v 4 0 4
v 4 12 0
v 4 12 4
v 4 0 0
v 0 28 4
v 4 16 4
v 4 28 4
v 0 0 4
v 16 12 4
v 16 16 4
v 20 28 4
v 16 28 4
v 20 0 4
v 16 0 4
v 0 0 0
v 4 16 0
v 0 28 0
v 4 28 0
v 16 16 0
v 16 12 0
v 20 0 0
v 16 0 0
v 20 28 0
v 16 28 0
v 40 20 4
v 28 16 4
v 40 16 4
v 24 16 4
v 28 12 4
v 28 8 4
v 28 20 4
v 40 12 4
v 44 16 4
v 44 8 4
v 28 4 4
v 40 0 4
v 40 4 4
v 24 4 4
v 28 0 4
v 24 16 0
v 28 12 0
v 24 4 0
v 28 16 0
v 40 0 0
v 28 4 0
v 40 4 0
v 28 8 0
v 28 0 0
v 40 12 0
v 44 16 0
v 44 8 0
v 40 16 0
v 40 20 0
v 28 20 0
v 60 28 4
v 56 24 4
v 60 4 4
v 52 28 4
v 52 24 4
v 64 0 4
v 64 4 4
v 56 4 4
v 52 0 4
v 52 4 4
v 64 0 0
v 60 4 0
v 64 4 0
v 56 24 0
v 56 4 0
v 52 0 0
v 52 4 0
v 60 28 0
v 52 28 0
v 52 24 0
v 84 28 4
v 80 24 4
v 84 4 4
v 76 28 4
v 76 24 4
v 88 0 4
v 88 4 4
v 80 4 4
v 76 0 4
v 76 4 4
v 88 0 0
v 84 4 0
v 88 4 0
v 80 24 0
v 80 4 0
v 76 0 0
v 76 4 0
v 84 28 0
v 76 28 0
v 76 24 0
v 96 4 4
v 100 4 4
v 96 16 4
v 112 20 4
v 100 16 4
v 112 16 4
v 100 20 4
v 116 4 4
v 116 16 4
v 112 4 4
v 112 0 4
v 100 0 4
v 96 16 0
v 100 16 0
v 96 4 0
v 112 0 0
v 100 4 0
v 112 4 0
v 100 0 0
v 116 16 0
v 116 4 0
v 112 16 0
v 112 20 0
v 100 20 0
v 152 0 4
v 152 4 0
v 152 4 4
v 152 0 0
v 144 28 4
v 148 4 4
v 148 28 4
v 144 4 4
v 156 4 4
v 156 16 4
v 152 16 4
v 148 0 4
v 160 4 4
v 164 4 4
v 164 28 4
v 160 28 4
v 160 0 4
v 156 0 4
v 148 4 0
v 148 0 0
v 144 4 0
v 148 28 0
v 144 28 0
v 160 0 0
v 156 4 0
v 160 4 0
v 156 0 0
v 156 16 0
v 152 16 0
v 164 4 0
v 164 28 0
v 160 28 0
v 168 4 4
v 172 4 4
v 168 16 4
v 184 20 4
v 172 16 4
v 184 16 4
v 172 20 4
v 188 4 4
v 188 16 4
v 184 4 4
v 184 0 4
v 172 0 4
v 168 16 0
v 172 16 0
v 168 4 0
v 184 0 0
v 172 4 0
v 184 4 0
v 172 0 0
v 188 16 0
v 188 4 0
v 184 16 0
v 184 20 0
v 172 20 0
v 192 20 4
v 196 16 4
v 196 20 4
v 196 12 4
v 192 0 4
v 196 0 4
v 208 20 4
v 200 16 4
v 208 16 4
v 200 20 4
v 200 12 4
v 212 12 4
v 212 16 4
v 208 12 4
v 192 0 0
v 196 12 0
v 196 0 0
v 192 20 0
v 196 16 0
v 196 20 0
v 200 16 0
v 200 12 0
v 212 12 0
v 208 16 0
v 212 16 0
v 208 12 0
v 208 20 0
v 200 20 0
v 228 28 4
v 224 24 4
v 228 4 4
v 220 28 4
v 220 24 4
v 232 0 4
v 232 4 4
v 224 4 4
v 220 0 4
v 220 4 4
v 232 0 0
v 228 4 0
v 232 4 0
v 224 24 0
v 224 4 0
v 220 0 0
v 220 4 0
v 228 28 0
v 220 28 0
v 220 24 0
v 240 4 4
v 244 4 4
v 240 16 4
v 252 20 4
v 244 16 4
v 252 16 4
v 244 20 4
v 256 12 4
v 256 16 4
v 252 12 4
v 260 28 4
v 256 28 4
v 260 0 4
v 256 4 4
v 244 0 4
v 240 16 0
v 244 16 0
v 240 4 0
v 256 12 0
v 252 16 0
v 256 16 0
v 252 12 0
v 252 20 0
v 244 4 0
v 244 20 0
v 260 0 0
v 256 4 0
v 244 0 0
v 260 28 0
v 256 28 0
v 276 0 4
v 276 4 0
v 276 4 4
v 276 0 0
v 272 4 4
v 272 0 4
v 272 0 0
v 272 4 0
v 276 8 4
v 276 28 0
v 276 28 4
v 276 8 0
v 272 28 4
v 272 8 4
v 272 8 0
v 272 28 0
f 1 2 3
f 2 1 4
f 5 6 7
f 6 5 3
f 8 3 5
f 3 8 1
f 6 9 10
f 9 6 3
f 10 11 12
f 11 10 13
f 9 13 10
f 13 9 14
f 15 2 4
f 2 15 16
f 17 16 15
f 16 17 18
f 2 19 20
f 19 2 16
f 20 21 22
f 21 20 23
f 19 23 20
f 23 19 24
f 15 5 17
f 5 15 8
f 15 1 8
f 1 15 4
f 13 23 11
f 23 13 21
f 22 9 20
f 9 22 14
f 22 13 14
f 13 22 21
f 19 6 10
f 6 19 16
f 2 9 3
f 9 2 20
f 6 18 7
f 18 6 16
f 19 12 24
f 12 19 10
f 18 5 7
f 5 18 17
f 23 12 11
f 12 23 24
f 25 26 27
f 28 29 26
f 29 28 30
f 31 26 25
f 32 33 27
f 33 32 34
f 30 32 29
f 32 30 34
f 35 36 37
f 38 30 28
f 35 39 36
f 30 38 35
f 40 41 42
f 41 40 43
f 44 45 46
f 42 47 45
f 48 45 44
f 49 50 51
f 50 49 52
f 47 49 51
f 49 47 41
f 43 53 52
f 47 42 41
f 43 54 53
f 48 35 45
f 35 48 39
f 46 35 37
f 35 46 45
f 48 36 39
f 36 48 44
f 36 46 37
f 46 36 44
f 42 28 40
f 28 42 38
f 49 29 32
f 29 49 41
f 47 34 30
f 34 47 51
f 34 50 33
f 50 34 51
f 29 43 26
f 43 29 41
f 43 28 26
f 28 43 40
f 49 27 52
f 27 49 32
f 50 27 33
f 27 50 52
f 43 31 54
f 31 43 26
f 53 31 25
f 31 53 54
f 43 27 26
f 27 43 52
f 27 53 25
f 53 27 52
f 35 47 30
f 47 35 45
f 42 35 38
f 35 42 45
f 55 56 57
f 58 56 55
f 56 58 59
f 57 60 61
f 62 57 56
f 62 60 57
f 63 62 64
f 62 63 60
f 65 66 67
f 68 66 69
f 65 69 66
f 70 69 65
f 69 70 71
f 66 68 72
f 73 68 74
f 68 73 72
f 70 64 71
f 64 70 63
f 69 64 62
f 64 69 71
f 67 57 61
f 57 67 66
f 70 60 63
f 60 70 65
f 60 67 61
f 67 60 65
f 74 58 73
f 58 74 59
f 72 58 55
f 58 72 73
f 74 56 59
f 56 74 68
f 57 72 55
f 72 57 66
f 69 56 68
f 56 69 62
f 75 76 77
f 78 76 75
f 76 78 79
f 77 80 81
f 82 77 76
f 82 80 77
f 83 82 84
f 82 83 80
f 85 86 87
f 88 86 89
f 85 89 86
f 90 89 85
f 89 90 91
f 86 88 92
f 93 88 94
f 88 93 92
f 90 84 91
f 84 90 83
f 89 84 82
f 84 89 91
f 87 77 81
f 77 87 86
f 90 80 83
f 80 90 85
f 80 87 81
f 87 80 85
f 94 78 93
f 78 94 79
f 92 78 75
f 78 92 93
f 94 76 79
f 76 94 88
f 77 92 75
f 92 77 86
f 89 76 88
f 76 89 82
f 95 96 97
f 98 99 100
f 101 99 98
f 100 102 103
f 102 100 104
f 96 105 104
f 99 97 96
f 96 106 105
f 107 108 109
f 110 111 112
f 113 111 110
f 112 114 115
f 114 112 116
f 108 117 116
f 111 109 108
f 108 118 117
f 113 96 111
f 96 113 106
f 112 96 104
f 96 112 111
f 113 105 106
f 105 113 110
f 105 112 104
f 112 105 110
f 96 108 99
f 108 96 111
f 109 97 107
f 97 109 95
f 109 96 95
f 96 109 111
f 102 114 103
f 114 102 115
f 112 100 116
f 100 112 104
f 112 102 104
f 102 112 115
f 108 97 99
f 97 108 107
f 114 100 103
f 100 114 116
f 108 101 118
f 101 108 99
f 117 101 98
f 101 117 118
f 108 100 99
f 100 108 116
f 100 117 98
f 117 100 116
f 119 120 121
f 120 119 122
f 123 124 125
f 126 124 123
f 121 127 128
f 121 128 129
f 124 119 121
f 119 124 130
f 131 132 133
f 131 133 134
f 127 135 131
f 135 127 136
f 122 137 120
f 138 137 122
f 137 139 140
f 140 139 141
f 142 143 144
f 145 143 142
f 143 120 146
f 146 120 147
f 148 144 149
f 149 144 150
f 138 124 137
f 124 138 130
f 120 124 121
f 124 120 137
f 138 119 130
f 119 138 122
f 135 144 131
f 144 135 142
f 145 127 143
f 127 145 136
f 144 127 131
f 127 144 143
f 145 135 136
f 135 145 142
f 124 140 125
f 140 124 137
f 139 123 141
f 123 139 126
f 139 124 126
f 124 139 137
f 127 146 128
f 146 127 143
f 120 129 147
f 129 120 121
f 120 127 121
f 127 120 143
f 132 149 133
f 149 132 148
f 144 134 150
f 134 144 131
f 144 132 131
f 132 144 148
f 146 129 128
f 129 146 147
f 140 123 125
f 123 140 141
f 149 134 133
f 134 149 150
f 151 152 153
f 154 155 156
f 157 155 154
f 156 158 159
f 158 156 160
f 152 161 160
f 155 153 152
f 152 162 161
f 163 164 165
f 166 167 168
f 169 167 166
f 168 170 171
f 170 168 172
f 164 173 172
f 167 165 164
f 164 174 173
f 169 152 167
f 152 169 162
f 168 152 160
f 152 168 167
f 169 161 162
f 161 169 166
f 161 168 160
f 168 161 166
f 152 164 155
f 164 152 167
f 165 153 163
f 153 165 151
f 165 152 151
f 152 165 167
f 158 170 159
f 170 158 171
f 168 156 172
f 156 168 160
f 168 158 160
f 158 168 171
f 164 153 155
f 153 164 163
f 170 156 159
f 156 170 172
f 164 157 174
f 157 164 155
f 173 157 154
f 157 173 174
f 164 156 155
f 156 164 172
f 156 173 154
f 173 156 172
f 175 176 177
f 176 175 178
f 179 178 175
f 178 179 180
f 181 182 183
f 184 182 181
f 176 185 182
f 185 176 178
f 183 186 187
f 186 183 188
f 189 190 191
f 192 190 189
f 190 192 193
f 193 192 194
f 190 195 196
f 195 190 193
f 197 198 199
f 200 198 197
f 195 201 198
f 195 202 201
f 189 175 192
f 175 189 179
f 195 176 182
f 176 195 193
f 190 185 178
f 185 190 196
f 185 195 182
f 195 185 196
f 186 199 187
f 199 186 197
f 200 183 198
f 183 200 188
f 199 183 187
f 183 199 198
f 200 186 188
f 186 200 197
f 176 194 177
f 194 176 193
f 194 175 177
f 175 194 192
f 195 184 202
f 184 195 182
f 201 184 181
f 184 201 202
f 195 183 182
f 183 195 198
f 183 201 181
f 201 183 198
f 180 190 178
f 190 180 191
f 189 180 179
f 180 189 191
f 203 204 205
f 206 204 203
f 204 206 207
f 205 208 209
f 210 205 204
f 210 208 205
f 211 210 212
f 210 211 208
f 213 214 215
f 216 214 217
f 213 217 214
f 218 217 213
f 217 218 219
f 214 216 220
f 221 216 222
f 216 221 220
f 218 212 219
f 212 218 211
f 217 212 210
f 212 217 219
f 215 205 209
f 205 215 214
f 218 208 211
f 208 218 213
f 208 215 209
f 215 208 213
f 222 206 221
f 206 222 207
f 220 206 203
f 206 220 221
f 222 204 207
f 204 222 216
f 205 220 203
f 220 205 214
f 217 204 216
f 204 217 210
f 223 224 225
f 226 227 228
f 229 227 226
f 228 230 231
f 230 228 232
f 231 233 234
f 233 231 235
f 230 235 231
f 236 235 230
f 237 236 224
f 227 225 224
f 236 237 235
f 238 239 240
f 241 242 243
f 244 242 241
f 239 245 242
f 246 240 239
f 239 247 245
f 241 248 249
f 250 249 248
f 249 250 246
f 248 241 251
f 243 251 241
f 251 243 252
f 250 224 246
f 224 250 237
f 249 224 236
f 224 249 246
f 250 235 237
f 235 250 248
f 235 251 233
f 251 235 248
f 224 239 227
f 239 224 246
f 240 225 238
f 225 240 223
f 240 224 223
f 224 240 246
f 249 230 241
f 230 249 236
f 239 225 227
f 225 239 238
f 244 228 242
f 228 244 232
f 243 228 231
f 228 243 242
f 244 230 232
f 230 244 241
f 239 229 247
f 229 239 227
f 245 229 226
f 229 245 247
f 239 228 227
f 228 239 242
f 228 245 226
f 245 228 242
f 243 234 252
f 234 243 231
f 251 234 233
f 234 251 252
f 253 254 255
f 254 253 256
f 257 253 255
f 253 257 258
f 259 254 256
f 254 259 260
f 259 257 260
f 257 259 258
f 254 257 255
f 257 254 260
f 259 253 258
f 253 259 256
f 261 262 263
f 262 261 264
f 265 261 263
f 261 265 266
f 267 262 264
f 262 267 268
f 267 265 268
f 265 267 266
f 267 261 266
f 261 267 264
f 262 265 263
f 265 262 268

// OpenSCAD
//Draw text
scale([4,4,4]) drawtext("Hello World!");

//Draw character set
//scale([2,2,2]) drawtext(" !\"#$%&'()*+,-./0123456789:;<=>?@ABCDEFGHIJKLMNOPQRSTUVWXYZ[\\]^_`abcdefghijklmnopqrstuvwxyz{|}");

module drawtext(text,center=false) {
	//Characters
	chars = " !\"#$%&'()*+,-./0123456789:;<=>?@ABCDEFGHIJKLMNOPQRSTUVWXYZ[\\]^_`abcdefghijklmnopqrstuvwxyz{|}";

	//Chracter table defining 5x7 characters
	//Adapted from: http://www.geocities.com/dinceraydin/djlcdsim/chartable.js
	char_table = [ [ 0, 0, 0, 0, 0, 0, 0],
                  [ 4, 0, 4, 4, 4, 4, 4],
                  [ 0, 0, 0, 0,10,10,10],
                  [10,10,31,10,31,10,10],
                  [ 4,30, 5,14,20,15, 4],
                  [ 3,19, 8, 4, 2,25,24],
                  [13,18,21, 8,20,18,12],
                  [ 0, 0, 0, 0, 8, 4,12],
                  [ 2, 4, 8, 8, 8, 4, 2],
                  [ 8, 4, 2, 2, 2, 4, 8],
                  [ 0, 4,21,14,21, 4, 0],
                  [ 0, 4, 4,31, 4, 4, 0],
                  [ 8, 4,12, 0, 0, 0, 0],
                  [ 0, 0, 0,31, 0, 0, 0],
                  [12,12, 0, 0, 0, 0, 0],
                  [ 0,16, 8, 4, 2, 1, 0],
                  [14,17,25,21,19,17,14],
                  [14, 4, 4, 4, 4,12, 4],
                  [31, 8, 4, 2, 1,17,14],
                  [14,17, 1, 2, 4, 2,31],
                  [ 2, 2,31,18,10, 6, 2],
                  [14,17, 1, 1,30,16,31],
                  [14,17,17,30,16, 8, 6],
                  [ 8, 8, 8, 4, 2, 1,31],
                  [14,17,17,14,17,17,14],
                  [12, 2, 1,15,17,17,14],
                  [ 0,12,12, 0,12,12, 0],
                  [ 8, 4,12, 0,12,12, 0],
                  [ 2, 4, 8,16, 8, 4, 2],
                  [ 0, 0,31, 0,31, 0, 0],
                  [16, 8, 4, 2, 4, 8,16],
                  [ 4, 0, 4, 2, 1,17,14],
                  [14,21,21,13, 1,17,14],
                  [17,17,31,17,17,17,14],
                  [30,17,17,30,17,17,30],
                  [14,17,16,16,16,17,14],
                  [30,17,17,17,17,17,30],
                  [31,16,16,30,16,16,31],
                  [16,16,16,30,16,16,31],
                  [15,17,17,23,16,17,14],
                  [17,17,17,31,17,17,17],
                  [14, 4, 4, 4, 4, 4,14],
                  [12,18, 2, 2, 2, 2, 7],
                  [17,18,20,24,20,18,17],
                  [31,16,16,16,16,16,16],
                  [17,17,17,21,21,27,17],
                  [17,17,19,21,25,17,17],
                  [14,17,17,17,17,17,14],
                  [16,16,16,30,17,17,30],
                  [13,18,21,17,17,17,14],
                  [17,18,20,30,17,17,30],
                  [30, 1, 1,14,16,16,15],
                  [ 4, 4, 4, 4, 4, 4,31],
                  [14,17,17,17,17,17,17],
                  [ 4,10,17,17,17,17,17],
                  [10,21,21,21,17,17,17],
                  [17,17,10, 4,10,17,17],
                  [ 4, 4, 4,10,17,17,17],
                  [31,16, 8, 4, 2, 1,31],
                  [14, 8, 8, 8, 8, 8,14],
                  [ 0, 1, 2, 4, 8,16, 0],
                  [14, 2, 2, 2, 2, 2,14],
                  [ 0, 0, 0, 0,17,10, 4],
                  [31, 0, 0, 0, 0, 0, 0],
                  [ 0, 0, 0, 0, 2, 4, 8],
                  [15,17,15, 1,14, 0, 0],
                  [30,17,17,25,22,16,16],
                  [14,17,16,16,14, 0, 0],
                  [15,17,17,19,13, 1, 1],
                  [14,16,31,17,14, 0, 0],
                  [ 8, 8, 8,28, 8, 9, 6],
                  [14, 1,15,17,15, 0, 0],
                  [17,17,17,25,22,16,16],
                  [14, 4, 4, 4,12, 0, 4],
                  [12,18, 2, 2, 2, 6, 2],
                  [18,20,24,20,18,16,16],
                  [14, 4, 4, 4, 4, 4,12],
                  [17,17,21,21,26, 0, 0],
                  [17,17,17,25,22, 0, 0],
                  [14,17,17,17,14, 0, 0],
                  [16,16,30,17,30, 0, 0],
                  [ 1, 1,15,19,13, 0, 0],
                  [16,16,16,25,22, 0, 0],
                  [30, 1,14,16,15, 0, 0],
                  [ 6, 9, 8, 8,28, 8, 8],
                  [13,19,17,17,17, 0, 0],
                  [ 4,10,17,17,17, 0, 0],
                  [10,21,21,17,17, 0, 0],
                  [17,10, 4,10,17, 0, 0],
                  [14, 1,15,17,17, 0, 0],
                  [31, 8, 4, 2,31, 0, 0],
                  [ 2, 4, 4, 8, 4, 4, 2],
                  [ 4, 4, 4, 4, 4, 4, 4],
                  [ 8, 4, 4, 2, 4, 4, 8] ];

	//Binary decode table
	dec_table = [ "00000", "00001", "00010", "00011", "00100", "00101",
  	            "00110", "00111", "01000", "01001", "01010", "01011",
  	            "01100", "01101", "01110", "01111", "10000", "10001",
  	            "10010", "10011", "10100", "10101", "10110", "10111",
	            "11000", "11001", "11010", "11011", "11100", "11101",
	            "11110", "11111" ];

    //Process string one character at a time
    for(itext = [0:len(text)-1]) {
        assign(length = len(text)) {
            //Convert character to index
            assign(ichar = search(text[itext],chars,1)[0]) {
                //Decode character - rows
                for(irow = [0:6]) {
                    assign(val = dec_table[char_table[ichar][irow]]) {
                        //Decode character - cols
                        for(icol = [0:4]) {
                            assign(bit = search(val[icol],"01",1)[0]) {
                                if(bit) {
                                    //Output cube
                                    if (center)
                                        translate([icol - 2.5 +
                                        (6*itext)-len(text)/2, irow-3.5,0])
                                            cube([1.0001,1.0001,1]);
                                    else {
                                        translate([icol + (6*itext), irow, 0])
                                            cube([1.0001,1.0001,1]);
                                    }
                                }
                            }
                        }
                    }
                }
            }
	}
}
}
